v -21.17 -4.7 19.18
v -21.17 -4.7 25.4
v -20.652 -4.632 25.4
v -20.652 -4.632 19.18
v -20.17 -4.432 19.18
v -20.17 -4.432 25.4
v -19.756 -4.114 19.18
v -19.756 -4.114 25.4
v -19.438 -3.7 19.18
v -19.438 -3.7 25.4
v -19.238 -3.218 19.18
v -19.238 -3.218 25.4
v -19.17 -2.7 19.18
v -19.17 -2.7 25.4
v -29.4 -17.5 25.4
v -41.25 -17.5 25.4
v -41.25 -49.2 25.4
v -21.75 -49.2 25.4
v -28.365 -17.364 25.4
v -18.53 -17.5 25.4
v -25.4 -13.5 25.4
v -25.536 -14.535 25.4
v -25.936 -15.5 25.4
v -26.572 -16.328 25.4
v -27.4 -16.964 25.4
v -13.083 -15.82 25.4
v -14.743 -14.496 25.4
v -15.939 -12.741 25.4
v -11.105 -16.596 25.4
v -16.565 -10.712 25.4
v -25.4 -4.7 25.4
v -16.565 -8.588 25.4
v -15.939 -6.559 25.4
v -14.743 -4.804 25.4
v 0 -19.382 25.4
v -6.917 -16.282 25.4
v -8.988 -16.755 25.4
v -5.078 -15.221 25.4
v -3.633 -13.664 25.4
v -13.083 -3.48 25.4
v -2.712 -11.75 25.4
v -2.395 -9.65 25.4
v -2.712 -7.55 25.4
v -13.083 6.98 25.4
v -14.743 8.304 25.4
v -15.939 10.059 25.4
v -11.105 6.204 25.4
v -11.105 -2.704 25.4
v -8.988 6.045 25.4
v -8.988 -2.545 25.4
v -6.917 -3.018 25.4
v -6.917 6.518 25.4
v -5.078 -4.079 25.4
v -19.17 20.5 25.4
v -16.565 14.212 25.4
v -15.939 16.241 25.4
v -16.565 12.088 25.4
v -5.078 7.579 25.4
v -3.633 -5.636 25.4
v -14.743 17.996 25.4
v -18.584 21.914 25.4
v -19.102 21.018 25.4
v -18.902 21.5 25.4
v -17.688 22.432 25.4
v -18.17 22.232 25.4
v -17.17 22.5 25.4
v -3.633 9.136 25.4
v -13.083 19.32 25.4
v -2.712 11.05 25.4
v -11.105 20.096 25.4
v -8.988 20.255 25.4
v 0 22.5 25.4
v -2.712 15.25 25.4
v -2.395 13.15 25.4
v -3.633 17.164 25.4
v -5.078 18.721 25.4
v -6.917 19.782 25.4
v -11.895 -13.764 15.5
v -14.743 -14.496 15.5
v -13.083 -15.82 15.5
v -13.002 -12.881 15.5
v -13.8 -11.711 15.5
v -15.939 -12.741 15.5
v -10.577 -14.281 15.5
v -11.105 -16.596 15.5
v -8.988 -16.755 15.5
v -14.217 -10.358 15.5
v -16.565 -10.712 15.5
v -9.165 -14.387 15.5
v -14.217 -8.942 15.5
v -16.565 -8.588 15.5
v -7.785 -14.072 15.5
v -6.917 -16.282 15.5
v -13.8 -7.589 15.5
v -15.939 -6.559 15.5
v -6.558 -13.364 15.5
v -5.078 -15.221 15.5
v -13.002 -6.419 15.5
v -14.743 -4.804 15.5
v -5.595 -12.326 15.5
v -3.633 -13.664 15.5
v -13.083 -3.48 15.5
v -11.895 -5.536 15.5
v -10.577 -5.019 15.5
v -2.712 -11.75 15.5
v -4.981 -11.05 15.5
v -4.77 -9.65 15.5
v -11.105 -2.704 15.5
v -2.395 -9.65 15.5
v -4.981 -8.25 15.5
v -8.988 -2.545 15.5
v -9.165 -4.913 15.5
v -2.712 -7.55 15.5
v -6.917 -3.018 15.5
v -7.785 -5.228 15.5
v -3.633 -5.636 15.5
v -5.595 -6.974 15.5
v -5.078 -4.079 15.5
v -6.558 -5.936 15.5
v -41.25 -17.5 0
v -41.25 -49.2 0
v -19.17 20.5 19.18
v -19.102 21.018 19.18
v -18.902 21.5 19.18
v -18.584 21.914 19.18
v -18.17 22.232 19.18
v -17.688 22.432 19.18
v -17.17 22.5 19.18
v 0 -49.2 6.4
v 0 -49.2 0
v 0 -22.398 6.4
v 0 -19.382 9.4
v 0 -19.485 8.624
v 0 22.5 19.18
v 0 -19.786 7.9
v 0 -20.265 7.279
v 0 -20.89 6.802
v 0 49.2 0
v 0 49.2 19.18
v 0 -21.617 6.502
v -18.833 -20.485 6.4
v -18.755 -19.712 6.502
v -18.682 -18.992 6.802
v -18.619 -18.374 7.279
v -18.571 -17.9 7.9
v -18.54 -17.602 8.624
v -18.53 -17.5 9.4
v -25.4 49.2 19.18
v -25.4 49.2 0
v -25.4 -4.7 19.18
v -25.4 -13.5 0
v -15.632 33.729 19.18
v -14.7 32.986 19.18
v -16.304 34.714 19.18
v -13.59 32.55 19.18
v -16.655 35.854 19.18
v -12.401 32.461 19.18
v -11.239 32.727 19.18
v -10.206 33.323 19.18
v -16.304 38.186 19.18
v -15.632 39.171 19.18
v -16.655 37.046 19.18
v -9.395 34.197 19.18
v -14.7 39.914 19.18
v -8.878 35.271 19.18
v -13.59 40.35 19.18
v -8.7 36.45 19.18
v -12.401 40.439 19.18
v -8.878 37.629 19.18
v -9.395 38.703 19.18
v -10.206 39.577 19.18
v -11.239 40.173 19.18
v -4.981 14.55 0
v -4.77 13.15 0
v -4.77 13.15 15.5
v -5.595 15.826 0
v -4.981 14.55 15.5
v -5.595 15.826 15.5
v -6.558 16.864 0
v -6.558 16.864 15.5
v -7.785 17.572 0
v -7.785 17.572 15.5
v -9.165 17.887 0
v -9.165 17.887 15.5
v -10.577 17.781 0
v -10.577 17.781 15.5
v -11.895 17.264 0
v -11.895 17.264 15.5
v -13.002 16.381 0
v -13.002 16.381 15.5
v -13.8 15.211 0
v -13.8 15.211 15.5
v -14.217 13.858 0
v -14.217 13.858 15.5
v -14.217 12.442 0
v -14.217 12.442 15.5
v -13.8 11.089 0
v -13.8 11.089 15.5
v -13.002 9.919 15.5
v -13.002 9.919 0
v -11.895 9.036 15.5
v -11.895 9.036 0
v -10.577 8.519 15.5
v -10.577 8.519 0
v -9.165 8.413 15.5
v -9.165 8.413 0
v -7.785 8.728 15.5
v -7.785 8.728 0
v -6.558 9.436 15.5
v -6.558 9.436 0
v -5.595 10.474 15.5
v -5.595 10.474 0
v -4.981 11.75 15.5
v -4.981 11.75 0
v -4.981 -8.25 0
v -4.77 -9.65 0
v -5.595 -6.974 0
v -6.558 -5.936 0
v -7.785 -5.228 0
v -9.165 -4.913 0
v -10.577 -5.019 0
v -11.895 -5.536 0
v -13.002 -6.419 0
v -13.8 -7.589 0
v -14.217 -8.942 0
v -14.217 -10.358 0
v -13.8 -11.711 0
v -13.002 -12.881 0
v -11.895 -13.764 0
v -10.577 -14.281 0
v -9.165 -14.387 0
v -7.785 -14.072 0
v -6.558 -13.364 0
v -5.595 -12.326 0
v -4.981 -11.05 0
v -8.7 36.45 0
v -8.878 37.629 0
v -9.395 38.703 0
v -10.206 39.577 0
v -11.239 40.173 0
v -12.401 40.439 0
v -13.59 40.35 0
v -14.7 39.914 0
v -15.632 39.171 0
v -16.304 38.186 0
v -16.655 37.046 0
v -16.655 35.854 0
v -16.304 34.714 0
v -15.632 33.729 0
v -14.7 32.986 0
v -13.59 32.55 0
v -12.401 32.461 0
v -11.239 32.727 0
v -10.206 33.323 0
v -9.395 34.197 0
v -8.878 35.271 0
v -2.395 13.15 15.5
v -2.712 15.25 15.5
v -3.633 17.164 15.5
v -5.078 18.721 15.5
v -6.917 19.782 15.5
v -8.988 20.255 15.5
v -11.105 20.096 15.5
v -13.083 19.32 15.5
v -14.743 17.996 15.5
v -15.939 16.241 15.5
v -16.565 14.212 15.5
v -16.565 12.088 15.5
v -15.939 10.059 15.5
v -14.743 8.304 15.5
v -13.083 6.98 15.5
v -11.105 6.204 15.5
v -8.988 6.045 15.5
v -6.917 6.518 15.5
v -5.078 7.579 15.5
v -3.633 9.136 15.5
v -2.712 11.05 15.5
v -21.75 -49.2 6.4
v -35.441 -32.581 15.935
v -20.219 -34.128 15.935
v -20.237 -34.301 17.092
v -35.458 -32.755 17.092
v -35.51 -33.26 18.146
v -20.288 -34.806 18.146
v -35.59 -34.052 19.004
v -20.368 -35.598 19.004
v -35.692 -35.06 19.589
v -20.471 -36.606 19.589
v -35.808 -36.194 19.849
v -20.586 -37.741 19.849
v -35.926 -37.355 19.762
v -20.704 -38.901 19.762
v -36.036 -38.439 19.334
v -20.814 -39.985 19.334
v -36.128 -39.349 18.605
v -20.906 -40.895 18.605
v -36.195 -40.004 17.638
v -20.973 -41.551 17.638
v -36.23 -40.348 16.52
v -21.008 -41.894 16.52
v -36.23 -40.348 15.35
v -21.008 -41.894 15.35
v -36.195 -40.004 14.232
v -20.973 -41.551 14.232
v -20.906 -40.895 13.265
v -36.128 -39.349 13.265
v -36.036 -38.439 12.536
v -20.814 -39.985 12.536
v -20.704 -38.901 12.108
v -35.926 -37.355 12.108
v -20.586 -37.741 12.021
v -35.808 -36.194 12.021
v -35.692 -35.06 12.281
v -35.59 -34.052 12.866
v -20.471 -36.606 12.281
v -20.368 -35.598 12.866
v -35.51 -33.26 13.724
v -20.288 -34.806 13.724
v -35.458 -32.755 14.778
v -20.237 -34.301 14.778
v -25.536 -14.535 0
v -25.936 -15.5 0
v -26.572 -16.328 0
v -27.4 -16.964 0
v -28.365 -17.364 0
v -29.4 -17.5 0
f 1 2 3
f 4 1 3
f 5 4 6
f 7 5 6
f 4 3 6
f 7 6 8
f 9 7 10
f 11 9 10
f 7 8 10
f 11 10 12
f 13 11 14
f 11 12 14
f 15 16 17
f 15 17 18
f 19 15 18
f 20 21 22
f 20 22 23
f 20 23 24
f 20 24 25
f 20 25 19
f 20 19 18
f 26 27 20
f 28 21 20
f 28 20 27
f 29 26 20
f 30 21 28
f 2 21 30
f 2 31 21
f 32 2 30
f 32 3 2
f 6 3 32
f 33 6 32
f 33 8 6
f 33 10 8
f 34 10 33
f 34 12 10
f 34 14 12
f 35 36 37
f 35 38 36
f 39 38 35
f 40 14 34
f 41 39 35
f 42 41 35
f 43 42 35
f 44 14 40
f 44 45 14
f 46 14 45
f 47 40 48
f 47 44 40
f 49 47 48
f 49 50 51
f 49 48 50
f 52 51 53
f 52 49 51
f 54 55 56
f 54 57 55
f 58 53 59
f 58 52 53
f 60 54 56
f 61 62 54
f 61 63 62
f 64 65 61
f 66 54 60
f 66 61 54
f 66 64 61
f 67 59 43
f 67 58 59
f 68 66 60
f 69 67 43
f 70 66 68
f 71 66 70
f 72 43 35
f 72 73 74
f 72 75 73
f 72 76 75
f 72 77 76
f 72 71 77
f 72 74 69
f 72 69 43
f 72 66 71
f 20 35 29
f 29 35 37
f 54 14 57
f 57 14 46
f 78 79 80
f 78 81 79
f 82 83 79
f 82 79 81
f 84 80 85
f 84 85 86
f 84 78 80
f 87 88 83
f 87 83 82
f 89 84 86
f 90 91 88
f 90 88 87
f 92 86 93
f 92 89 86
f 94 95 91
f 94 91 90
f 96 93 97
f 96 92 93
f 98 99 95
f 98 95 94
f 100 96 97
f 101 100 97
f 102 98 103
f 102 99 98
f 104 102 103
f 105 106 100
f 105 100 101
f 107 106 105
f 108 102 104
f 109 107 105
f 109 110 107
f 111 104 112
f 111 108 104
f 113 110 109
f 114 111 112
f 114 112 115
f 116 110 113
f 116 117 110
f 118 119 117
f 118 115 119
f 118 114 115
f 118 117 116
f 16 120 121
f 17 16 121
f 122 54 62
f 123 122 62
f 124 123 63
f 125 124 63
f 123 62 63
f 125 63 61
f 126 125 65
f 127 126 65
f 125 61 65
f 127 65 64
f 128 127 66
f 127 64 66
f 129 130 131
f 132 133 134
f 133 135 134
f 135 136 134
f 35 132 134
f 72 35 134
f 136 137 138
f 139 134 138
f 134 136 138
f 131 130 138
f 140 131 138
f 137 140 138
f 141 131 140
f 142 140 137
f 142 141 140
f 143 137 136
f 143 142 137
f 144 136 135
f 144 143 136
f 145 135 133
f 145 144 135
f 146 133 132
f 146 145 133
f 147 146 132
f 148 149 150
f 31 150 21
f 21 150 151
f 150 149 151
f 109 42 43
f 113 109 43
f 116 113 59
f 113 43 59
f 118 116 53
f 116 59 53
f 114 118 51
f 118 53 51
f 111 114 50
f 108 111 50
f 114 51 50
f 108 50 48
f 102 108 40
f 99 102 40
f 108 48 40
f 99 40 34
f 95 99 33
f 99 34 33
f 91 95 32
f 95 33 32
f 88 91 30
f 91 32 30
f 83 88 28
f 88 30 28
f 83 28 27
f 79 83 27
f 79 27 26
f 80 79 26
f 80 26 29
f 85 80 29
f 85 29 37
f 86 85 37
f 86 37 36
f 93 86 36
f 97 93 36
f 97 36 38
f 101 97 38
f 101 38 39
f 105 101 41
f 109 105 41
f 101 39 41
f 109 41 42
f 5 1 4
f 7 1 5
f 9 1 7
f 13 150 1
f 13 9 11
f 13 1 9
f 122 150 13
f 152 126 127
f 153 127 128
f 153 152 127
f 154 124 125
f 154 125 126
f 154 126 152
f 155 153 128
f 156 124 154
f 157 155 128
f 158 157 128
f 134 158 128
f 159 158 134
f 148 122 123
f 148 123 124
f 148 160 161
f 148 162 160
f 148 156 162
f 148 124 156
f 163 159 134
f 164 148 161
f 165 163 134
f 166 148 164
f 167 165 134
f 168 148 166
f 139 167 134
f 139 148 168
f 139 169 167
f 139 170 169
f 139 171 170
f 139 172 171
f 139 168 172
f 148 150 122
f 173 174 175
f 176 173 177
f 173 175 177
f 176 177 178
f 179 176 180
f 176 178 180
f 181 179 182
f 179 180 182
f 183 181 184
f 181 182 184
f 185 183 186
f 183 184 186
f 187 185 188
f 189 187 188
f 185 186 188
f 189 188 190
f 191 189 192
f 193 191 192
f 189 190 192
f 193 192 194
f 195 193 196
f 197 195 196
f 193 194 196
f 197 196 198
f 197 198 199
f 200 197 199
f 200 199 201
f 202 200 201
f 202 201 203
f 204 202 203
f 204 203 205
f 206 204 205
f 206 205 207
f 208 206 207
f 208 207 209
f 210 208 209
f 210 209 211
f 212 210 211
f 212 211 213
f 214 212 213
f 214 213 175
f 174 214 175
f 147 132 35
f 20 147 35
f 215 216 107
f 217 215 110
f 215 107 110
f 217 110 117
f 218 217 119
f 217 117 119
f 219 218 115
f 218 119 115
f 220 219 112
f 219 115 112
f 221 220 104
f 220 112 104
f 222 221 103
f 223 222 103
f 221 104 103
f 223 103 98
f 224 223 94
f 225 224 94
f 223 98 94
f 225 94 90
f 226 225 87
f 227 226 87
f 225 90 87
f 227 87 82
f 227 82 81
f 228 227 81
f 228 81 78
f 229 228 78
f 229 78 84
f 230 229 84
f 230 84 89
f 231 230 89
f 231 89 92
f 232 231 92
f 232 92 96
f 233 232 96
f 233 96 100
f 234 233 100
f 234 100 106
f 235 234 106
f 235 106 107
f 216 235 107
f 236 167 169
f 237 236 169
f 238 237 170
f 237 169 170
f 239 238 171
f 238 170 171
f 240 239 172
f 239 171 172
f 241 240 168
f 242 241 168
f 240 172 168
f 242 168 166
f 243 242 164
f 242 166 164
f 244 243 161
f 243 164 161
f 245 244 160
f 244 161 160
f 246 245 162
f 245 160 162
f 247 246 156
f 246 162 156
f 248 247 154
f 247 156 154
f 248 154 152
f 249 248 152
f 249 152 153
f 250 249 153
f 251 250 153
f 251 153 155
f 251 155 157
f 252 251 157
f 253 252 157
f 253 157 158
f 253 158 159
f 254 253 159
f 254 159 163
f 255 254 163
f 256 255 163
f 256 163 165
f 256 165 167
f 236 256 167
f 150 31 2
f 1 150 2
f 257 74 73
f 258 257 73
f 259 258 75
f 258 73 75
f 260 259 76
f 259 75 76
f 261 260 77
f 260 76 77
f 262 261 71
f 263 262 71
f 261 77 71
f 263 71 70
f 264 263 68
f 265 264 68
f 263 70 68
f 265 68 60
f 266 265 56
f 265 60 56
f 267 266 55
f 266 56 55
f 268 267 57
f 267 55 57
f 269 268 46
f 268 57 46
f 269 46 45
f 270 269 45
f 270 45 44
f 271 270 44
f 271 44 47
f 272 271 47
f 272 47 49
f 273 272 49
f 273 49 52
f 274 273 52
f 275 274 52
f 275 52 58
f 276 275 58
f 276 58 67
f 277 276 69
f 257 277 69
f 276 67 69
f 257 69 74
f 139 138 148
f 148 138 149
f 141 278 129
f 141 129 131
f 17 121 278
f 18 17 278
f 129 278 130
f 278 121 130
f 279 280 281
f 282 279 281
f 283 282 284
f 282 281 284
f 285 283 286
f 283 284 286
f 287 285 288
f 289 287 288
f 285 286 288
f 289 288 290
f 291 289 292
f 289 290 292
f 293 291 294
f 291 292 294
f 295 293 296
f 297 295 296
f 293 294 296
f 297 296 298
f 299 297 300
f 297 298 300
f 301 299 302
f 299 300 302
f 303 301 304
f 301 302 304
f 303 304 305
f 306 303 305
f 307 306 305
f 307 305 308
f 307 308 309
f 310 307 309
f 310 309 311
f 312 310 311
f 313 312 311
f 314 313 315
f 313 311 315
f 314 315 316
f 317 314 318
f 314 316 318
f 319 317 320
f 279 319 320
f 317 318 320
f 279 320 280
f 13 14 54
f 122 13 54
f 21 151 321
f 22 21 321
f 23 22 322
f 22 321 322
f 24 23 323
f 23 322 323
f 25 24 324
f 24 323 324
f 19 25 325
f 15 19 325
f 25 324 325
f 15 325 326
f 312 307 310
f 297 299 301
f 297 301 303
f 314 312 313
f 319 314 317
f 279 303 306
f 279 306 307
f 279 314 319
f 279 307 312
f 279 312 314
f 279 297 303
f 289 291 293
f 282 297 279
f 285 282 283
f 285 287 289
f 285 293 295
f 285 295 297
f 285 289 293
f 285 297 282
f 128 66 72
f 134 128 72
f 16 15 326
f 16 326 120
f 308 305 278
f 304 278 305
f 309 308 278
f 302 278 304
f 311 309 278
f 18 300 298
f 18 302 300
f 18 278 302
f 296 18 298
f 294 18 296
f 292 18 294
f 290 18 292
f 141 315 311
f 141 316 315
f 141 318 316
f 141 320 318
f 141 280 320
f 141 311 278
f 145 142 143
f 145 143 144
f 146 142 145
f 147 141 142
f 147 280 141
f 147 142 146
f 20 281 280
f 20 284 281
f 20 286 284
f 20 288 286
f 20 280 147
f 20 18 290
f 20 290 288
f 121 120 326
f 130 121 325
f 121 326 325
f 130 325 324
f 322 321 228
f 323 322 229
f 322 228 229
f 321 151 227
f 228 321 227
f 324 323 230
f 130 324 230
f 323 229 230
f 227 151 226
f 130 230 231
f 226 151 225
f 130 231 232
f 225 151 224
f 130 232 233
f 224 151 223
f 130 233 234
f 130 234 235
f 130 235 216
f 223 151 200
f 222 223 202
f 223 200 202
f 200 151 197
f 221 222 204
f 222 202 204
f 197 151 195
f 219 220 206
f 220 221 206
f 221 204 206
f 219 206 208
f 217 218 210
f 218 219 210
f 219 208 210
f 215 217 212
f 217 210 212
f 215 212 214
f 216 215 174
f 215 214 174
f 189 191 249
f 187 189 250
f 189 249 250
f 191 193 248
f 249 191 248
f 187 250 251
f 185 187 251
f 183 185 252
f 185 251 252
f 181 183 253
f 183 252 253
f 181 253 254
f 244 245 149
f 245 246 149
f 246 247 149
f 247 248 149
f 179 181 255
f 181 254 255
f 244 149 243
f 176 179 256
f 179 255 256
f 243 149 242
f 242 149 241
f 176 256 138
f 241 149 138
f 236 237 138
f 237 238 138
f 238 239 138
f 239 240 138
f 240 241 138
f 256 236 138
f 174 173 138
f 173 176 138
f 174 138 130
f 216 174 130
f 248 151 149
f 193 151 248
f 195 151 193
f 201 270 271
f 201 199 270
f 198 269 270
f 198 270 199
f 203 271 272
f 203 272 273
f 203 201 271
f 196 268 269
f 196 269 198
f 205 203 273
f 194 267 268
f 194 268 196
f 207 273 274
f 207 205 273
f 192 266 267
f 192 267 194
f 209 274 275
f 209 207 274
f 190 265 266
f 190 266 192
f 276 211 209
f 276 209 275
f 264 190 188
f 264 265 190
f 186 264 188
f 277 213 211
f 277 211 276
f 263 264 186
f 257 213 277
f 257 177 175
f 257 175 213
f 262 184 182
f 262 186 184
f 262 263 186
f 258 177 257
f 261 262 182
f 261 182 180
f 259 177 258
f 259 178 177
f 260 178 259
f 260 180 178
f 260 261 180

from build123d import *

# Parameters (mm, degrees)
F1_DEPTH  = 25.4
F3_DEPTH  = 6.22
F7_DEPTH  = 25
F8_R      = 3.925
F9_DEPTH  = 15.3
F10_R     = 4
F11_DEPTH = 19.181
F12_R     = 4.75
F13_DEPTH = 25.401
F14_DEPTH = 25.401
F15_R     = 7.125
F16_DEPTH = 9.9
F17_DEPTH = 9.9


with BuildPart() as f1:
    # F0 (on Top) → F1 (new body)
    with BuildSketch(Plane.XY):
        with BuildLine():
            Line((0, -49.2), (0, 49.2))
            Line((0, 49.2), (-25.4, 49.2))
            Line((-25.4, 49.2), (-25.4, -13.5))
            ThreePointArc((-25.4, -13.5), (-26.571573, -16.328427), (-29.4, -17.5))
            Line((-29.4, -17.5), (-41.25, -17.5))
            Line((-41.25, -17.5), (-41.25, -49.2))
            Line((-41.25, -49.2), (0, -49.2))
        make_face()
    extrude(amount=F1_DEPTH)

    # F2 (on face) → F3 (cut)
    with BuildSketch(Plane.XY.offset(25.4)):
        with BuildLine():
            Line((0, 49.2), (-25.4, 49.2))
            Line((-25.4, 49.2), (-25.4, -4.7))
            Line((-25.4, -4.7), (-21.17, -4.7))
            ThreePointArc((-21.17, -4.7), (-19.755786, -4.114214), (-19.17, -2.7))
            Line((-19.17, -2.7), (-19.17, 20.5))
            ThreePointArc((-19.17, 20.5), (-18.584214, 21.914214), (-17.17, 22.5))
            Line((-17.17, 22.5), (0, 22.5))
            Line((0, 22.5), (0, 49.2))
        make_face()
    extrude(amount=-F3_DEPTH, mode=Mode.SUBTRACT)

    # F6 (on face) → F7 (cut)
    with BuildSketch(Plane(origin=(-16.581312, 1.684285, 0), x_dir=(0.101057, 0.994881, 0), z_dir=(0.994881, -0.101057, 0))):
        with BuildLine():
            Line((-19.283002, 9.4), (-19.283002, 30.4))
            Line((-19.283002, 30.4), (-56.146122, 30.4))
            Line((-56.146122, 30.4), (-56.146122, 6.4))
            Line((-56.146122, 6.4), (-22.283002, 6.4))
            ThreePointArc((-22.283002, 6.4), (-20.161682, 7.27868), (-19.283002, 9.4))
        make_face()
    extrude(amount=F7_DEPTH, mode=Mode.SUBTRACT)

    # F8 (on face) → F9 (cut)
    with BuildSketch(Plane(origin=(-16.581312, 1.684285, 0), x_dir=(0.101057, 0.994881, 0), z_dir=(0.994881, -0.101057, 0))):
        with Locations((-39.921122, 15.935)):
            Circle(F8_R)
    extrude(amount=-F9_DEPTH, mode=Mode.SUBTRACT)

    # F10 (on face) → F11 (cut, through all)
    with BuildSketch(Plane.XY.offset(19.18)):
        with Locations((-12.7, 36.45)):
            Circle(F10_R)
    extrude(amount=-F11_DEPTH, mode=Mode.SUBTRACT)

    # F12 (on face) → F13 (cut, through all)
    with BuildSketch(Plane.XY.offset(25.4)):
        with Locations((-9.52, 13.15)):
            Circle(F12_R)
    extrude(amount=-F13_DEPTH, mode=Mode.SUBTRACT)

    # F12 (on face) → F14 (cut, through all)
    with BuildSketch(Plane.XY.offset(25.4)):
        with Locations((-9.52, -9.65)):
            Circle(F12_R)
    extrude(amount=-F14_DEPTH, mode=Mode.SUBTRACT)

    # F15 (on face) → F16 (cut)
    with BuildSketch(Plane.XY.offset(25.4)):
        with Locations((-9.52, 13.15)):
            Circle(F15_R)
    extrude(amount=-F16_DEPTH, mode=Mode.SUBTRACT)

    # F15 (on face) → F17 (cut)
    with BuildSketch(Plane.XY.offset(25.4)):
        with Locations((-9.52, -9.65)):
            Circle(F15_R)
    extrude(amount=-F17_DEPTH, mode=Mode.SUBTRACT)


solid = f1.part
